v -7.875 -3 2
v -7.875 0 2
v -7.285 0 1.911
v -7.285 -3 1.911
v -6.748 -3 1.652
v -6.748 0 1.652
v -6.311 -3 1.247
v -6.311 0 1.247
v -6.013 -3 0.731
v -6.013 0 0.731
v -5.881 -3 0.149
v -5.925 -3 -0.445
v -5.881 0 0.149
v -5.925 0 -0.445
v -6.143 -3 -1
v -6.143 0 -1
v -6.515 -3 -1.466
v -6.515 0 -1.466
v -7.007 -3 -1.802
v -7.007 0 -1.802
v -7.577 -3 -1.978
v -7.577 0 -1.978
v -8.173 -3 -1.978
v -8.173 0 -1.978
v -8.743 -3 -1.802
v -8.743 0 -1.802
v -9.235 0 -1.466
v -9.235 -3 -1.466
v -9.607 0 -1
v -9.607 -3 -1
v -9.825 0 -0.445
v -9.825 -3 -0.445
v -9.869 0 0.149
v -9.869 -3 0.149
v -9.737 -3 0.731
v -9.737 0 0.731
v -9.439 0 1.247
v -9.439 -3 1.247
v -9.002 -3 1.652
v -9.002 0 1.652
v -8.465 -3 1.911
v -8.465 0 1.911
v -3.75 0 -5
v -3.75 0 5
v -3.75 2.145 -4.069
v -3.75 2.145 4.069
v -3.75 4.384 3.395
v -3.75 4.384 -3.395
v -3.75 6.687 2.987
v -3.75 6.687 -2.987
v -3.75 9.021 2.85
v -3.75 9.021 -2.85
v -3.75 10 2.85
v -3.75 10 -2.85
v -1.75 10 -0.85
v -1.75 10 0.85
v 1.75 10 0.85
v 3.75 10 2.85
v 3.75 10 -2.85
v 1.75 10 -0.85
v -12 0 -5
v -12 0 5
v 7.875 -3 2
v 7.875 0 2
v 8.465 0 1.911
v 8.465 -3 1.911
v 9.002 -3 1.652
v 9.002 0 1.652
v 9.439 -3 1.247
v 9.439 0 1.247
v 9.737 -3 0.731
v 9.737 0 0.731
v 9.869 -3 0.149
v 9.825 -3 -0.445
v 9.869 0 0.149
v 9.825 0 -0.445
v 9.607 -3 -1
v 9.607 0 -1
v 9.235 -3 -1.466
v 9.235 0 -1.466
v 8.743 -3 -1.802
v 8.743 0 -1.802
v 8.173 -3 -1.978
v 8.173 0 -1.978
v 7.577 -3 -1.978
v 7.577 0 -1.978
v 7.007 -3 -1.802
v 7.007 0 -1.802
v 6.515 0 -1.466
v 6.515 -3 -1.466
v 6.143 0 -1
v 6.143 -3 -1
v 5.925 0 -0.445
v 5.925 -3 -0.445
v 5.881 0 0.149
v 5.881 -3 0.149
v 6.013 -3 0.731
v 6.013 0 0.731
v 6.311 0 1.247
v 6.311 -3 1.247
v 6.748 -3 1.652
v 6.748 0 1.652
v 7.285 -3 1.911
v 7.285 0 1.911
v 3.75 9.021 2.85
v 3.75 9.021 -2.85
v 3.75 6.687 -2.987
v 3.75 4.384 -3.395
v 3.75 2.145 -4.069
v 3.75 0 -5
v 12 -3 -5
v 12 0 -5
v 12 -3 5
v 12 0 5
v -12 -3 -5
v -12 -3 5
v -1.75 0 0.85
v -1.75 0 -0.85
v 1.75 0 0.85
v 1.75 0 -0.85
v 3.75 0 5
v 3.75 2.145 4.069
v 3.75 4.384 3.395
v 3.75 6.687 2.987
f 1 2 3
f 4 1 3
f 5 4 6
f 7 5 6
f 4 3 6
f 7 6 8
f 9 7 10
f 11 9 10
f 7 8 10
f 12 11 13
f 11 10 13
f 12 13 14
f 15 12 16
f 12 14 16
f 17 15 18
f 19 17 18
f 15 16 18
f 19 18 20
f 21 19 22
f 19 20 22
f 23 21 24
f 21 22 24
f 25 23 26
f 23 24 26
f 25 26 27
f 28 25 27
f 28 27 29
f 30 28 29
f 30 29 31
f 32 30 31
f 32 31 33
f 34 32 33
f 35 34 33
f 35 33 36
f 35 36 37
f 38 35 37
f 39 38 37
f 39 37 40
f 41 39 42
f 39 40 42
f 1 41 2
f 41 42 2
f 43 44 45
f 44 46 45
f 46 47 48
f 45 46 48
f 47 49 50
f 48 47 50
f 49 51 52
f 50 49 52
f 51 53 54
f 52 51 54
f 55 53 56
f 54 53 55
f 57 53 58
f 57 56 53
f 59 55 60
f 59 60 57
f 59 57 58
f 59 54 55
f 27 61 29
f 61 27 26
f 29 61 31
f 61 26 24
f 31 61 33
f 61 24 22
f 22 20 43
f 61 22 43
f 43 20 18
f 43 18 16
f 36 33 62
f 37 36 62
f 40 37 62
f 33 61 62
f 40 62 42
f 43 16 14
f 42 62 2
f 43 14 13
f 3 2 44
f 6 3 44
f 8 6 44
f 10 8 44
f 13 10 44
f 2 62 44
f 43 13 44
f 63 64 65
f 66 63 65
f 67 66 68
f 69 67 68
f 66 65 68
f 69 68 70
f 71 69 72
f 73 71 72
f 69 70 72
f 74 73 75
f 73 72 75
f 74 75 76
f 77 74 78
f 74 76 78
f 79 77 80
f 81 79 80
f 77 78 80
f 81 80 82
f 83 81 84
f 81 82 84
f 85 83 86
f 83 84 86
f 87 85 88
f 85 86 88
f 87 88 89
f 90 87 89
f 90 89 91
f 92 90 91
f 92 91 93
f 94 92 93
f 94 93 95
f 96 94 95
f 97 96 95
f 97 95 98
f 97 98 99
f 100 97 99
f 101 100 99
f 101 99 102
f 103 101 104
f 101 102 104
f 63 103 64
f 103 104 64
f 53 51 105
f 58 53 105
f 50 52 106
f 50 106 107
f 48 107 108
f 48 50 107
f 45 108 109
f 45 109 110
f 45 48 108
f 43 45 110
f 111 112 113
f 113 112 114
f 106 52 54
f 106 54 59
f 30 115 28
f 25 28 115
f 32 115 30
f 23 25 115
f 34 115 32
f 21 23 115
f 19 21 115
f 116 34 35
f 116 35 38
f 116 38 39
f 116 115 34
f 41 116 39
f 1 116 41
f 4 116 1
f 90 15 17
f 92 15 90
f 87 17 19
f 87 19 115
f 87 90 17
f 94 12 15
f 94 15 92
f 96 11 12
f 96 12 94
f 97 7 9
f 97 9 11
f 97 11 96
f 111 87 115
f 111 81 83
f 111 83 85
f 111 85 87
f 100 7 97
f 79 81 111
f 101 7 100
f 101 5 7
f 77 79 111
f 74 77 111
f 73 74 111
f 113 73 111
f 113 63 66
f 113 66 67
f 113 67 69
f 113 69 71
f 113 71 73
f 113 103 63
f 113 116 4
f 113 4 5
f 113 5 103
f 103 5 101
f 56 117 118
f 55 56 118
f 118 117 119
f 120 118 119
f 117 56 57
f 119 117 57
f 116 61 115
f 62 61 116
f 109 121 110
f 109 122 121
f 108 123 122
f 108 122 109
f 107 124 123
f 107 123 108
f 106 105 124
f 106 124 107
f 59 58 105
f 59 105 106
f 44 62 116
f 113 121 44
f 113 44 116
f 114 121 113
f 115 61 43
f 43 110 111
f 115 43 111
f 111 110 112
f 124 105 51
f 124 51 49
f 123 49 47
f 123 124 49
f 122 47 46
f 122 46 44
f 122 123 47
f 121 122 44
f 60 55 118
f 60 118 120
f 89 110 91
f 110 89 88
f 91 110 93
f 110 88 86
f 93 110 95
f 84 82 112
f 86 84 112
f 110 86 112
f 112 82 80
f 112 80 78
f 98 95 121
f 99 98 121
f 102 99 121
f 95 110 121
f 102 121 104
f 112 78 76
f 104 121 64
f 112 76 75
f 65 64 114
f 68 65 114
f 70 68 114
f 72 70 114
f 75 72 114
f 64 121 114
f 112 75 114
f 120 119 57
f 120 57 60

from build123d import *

# Parameters (mm, degrees)
SKETCH1_W           = 7.5
SKETCH1_H           = 5.7
SKETCH1_W_2         = 3.5
SKETCH1_H_2         = 1.7
BOSS_EXTRUDE1_DEPTH = 10
SKETCH2_W           = 24
SKETCH2_H           = 10
BOSS_EXTRUDE2_DEPTH = 3
FILLET1_R           = 20
SKETCH3_R           = 2
CUT_EXTRUDE1_DEPTH  = 3


with BuildPart() as part:
    # Sketch1 → Boss-Extrude1 (new body)
    with BuildSketch(Plane(origin=(0, 0, 0), x_dir=(1, 0, 0), z_dir=(0, 1, 0))):
        Rectangle(SKETCH1_W, SKETCH1_H)
        Rectangle(SKETCH1_W_2, SKETCH1_H_2, mode=Mode.SUBTRACT)
    extrude(amount=BOSS_EXTRUDE1_DEPTH)

    # Sketch2 → Boss-Extrude2 (add)
    with BuildSketch(Plane.XZ):
        Rectangle(SKETCH2_W, SKETCH2_H)
    extrude(amount=BOSS_EXTRUDE2_DEPTH)

    # Fillet1
    # the kernel refuses this fillet: 20 mm, written as the material it adds along each edge
    with BuildSketch(Plane(origin=(3.75, 0, 2.85), x_dir=(0, 0, 1), z_dir=(-1, 0, 0)), Plane(origin=(-3.75, 0, -2.85), x_dir=(0, 0, -1), z_dir=(1, 0, 0))) as fillet1_piece_1:
        with BuildLine():
            CenterArc((20, 9.020947844), FILLET1_R, 180, 26.810903424)
            Line((0, 9.020947844), (-0.4, 9.020947844))
            Line((-0.4, 9.020947844), (-0.4, 0))
            Line((-0.4, 0), (0, -0.4))
            ThreePointArc((0, -0.4), (1.075, -0.4), (1.793, -0.180418957))
            Line((1.793, -0.180418957), (2.15, 0))
        make_face()
    extrude(amount=7.5)

    # Sketch3 → Cut-Extrude1 (cut)
    with BuildSketch(Plane(origin=(0, 0, 0), x_dir=(1, 0, 0), z_dir=(0, 1, 0))):
        with Locations(Location((-7.875, 0, 0), (0, 0, 270))):
            Circle(SKETCH3_R)
        with Locations(Location((7.875, 0, 0), (0, 0, 270))):
            Circle(SKETCH3_R)
    extrude(amount=-CUT_EXTRUDE1_DEPTH, mode=Mode.SUBTRACT)


solid = part.part
